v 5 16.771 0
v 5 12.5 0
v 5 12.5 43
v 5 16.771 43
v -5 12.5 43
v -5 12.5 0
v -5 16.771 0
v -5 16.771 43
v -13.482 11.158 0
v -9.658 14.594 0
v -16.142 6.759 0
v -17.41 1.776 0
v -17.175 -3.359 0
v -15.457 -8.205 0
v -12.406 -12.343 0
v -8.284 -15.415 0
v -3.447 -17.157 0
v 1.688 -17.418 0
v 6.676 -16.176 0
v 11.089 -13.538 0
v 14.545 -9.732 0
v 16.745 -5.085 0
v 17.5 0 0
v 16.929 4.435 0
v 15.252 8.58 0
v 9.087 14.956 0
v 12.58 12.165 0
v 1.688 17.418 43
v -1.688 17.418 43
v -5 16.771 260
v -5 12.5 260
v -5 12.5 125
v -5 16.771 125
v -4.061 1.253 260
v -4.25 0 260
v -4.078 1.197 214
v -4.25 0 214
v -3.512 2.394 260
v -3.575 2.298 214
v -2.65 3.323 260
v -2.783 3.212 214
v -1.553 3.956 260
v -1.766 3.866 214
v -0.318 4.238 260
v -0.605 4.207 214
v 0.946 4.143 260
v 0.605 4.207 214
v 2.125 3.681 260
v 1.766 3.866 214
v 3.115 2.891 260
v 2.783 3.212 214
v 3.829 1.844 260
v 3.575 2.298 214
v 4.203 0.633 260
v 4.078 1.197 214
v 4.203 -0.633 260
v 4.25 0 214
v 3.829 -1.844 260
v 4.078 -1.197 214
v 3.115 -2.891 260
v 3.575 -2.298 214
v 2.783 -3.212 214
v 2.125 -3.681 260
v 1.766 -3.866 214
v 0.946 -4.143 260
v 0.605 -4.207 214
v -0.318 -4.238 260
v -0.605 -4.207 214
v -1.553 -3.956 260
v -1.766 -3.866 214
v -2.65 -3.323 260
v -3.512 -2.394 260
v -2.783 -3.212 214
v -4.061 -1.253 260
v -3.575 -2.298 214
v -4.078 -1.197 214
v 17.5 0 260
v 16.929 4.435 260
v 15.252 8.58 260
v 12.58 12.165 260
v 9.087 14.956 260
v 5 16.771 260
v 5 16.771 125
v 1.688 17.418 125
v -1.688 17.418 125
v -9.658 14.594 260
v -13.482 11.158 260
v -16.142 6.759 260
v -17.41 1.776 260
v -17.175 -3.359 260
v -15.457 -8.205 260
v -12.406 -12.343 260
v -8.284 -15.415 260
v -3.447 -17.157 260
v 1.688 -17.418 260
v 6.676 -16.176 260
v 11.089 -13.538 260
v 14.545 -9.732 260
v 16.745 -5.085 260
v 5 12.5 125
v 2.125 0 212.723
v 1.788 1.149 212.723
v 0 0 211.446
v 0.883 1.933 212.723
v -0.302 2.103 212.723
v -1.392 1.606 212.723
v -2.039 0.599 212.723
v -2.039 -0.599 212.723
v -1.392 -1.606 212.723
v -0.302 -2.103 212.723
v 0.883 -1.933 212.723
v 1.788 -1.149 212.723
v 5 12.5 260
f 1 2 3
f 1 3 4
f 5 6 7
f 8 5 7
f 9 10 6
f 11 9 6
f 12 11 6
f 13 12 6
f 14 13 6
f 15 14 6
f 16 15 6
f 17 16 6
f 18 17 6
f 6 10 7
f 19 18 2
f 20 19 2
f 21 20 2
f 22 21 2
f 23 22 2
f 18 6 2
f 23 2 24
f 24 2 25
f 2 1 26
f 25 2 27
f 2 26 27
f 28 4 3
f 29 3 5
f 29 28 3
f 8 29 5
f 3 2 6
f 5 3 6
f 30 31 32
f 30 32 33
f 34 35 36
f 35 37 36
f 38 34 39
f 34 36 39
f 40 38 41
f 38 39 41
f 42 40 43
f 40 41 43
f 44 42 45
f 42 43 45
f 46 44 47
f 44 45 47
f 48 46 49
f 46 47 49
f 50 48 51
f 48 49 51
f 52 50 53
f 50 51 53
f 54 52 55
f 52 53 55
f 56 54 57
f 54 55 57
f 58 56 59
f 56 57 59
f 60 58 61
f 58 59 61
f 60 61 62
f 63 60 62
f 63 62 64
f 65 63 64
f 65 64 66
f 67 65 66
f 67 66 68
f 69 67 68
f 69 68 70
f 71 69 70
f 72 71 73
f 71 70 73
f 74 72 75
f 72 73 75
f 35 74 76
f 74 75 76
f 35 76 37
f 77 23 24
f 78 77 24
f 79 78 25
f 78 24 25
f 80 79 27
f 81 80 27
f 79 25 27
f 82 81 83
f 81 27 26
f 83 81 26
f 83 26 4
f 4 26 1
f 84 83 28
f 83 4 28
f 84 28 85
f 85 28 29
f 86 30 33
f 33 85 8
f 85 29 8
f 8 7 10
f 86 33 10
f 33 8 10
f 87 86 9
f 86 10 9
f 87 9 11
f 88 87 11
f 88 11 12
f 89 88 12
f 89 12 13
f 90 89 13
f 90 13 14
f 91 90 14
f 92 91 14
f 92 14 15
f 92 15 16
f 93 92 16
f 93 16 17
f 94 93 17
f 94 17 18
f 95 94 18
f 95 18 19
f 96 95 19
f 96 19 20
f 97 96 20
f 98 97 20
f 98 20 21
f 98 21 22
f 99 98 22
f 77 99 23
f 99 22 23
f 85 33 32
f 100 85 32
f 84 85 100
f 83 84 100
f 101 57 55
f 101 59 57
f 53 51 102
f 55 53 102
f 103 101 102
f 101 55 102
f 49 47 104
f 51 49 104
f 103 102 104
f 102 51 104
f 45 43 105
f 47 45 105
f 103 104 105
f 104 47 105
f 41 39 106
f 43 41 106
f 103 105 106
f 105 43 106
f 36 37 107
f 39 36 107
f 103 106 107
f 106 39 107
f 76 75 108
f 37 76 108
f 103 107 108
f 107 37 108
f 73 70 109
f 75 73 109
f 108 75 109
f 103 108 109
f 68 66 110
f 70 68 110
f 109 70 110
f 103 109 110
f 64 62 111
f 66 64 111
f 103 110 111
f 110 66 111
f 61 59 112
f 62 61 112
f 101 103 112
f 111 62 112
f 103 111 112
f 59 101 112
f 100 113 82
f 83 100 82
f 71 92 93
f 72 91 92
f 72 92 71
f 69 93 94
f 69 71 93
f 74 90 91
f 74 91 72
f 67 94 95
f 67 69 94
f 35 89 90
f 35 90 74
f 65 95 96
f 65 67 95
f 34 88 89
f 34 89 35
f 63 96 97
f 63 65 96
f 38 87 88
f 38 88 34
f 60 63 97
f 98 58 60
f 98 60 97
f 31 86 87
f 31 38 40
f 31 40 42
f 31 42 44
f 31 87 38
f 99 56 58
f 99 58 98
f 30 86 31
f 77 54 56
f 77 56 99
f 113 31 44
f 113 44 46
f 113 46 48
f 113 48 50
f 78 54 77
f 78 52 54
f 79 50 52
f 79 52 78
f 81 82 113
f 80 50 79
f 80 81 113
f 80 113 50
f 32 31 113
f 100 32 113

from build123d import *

# Parameters (mm, degrees)
ESQUISSE1_R             = 17.5
BOSS_EXTRU_1_DEPTH      = 260
ESQUISSE2_W             = 10
ESQUISSE2_H             = 5.634133163
ENL_V_MAT_EXTRU_1_DEPTH = 135
ESQUISSE3_W             = 10
ESQUISSE3_H             = 5.967992577
ENL_V_MAT_EXTRU_2_DEPTH = 43
TROU_TARAUD_M101_D      = 8.5
TROU_TARAUD_M101_DEPTH  = 46
TROU_TARAUD_M101_TIP    = 2.553657631


with BuildPart() as part:
    # Esquisse1 → Boss.-Extru.1 (new body)
    with BuildSketch(Plane.XY):
        Circle(ESQUISSE1_R)
    extrude(amount=BOSS_EXTRU_1_DEPTH)

    # Esquisse2 → Enlèv. mat.-Extru.1 (cut)
    with BuildSketch(Plane.XY.offset(260)):
        with Locations((0, 15.317066582)):
            Rectangle(ESQUISSE2_W, ESQUISSE2_H)
    extrude(amount=-ENL_V_MAT_EXTRU_1_DEPTH, mode=Mode.SUBTRACT)

    # Esquisse3 → Enlèv. mat.-Extru.2 (cut)
    with BuildSketch(Plane(origin=(0, 0, 0), x_dir=(-1, 0, 0), z_dir=(0, 0, -1))):
        with Locations((0, 15.483996289)):
            Rectangle(ESQUISSE3_W, ESQUISSE3_H)
    extrude(amount=-ENL_V_MAT_EXTRU_2_DEPTH, mode=Mode.SUBTRACT)

    # Trou taraudé M101
    with Locations(Plane.XY.offset(260)):
        with Locations((0, 0)):
            Hole(TROU_TARAUD_M101_D / 2, depth=TROU_TARAUD_M101_DEPTH)
            with Locations((0, 0, -(TROU_TARAUD_M101_DEPTH + TROU_TARAUD_M101_TIP / 2))):  # 118° drill point
                Cone(0, TROU_TARAUD_M101_D / 2, TROU_TARAUD_M101_TIP, mode=Mode.SUBTRACT)


solid = part.part
